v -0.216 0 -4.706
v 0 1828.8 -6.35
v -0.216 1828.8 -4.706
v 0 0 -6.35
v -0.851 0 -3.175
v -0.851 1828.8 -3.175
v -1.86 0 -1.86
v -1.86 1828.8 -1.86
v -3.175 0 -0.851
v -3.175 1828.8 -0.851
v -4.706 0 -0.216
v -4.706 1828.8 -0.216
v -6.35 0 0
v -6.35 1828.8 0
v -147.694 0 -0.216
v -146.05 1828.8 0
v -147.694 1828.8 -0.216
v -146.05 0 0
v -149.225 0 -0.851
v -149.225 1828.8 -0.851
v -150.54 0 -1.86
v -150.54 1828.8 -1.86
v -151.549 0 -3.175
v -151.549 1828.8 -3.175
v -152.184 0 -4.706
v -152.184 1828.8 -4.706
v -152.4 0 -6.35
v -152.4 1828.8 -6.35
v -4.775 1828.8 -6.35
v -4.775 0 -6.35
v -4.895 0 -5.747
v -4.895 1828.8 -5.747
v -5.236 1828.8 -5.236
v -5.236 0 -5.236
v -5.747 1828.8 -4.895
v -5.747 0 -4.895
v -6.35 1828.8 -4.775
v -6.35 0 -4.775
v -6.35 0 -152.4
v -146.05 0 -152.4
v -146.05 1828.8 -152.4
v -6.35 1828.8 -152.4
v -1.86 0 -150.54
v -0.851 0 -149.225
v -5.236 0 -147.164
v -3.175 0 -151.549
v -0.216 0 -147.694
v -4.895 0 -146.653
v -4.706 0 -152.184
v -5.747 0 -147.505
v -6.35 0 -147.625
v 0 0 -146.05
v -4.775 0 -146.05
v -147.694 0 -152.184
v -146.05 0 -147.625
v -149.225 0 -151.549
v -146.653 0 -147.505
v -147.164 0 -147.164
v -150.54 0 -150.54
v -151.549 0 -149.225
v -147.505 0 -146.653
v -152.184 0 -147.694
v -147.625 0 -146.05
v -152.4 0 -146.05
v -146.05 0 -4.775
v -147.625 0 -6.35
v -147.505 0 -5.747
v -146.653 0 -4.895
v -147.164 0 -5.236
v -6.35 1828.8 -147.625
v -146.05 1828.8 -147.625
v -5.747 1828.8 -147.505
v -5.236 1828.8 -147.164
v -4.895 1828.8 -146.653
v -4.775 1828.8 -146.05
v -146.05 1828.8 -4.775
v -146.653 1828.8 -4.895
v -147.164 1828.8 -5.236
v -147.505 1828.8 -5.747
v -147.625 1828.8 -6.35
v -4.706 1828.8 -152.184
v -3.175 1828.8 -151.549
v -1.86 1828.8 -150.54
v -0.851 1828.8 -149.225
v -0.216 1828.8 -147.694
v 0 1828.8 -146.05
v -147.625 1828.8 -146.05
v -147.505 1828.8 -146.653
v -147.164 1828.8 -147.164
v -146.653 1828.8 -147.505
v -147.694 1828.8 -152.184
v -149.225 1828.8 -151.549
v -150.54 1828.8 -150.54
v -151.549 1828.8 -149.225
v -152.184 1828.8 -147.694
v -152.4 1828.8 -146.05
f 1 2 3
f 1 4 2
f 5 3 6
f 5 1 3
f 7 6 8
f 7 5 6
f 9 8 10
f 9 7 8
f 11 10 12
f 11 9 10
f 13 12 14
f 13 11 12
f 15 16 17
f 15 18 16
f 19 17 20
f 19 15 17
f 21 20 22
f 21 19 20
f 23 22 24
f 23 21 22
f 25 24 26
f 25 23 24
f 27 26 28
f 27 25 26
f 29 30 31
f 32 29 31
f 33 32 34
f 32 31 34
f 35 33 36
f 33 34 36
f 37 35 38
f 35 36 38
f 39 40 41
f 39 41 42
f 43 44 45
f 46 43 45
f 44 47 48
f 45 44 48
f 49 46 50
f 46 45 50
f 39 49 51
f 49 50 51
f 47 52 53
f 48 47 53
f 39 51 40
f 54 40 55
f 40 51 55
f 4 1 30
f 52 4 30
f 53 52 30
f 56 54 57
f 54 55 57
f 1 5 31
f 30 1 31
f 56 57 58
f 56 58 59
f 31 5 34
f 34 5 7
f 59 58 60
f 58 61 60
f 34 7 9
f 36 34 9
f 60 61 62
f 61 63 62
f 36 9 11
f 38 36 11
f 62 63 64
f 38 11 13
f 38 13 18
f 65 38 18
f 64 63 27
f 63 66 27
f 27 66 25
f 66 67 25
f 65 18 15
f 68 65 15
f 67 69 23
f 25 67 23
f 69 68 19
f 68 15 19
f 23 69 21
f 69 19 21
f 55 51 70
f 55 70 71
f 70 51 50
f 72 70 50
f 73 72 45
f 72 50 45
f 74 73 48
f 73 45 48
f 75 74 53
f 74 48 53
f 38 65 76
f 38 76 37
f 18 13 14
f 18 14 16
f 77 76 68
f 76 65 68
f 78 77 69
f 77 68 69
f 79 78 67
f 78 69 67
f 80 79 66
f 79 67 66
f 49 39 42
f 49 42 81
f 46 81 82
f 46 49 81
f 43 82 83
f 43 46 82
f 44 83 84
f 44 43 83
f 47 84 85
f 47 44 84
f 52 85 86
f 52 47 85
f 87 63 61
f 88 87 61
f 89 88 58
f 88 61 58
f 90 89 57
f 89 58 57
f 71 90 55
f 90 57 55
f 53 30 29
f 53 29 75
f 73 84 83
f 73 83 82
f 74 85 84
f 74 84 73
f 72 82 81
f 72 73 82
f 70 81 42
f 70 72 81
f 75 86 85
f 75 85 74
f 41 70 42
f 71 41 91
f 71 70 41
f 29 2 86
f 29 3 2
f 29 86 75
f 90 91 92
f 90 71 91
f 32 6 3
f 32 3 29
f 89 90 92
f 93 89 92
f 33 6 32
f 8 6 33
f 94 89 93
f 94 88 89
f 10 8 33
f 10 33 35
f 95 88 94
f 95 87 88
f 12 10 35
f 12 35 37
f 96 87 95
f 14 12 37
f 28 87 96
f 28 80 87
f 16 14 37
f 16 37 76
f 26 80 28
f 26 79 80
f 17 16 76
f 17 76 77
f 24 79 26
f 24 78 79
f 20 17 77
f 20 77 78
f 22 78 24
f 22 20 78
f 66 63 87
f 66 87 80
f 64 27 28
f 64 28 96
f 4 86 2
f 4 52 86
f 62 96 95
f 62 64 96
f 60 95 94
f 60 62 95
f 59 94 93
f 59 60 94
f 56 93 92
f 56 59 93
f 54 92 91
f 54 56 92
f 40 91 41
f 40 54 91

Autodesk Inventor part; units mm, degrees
ref_plane "YZ Plane" through (0, 0, 0) normal (1, 0, 0) x (0, 1, 0)
ref_plane "XZ Plane" through (0, 0, 0) normal (0, 1, 0) x (-1, 0, 0)
ref_plane "XY Plane" through (0, 0, 0) normal (0, 0, 1) x (1, 0, 0)
sketch "Sketch1" plane through (0, 0, 0) normal (0, 1, 0) x (-1, 0, 0)
  line L0 (6.35, 0) -> (146.05, 0)
  line L1 (152.4, -6.35) -> (152.4, -146.05)
  line L2 (146.05, -152.4) -> (6.35, -152.4)
  line L3 (0, -146.05) -> (0, -6.35)
  arc A0 (146.05, -152.4) -> (152.4, -146.05) centre (146.05, -146.05) ccw
  arc A1 (152.4, -6.35) -> (146.05, 0) centre (146.05, -6.35) ccw
  arc A2 (0, -146.05) -> (6.35, -152.4) centre (6.35, -146.05) ccw
  arc A3 (152.4, -6.35) -> (146.05, 0) centre (146.05, -6.35) ccw
  arc A4 (6.35, 0) -> (0, -6.35) centre (6.35, -6.35) ccw
  line L4 (147.6248, -146.05) -> (147.6248, -6.35)
  arc A5 (147.6248, -6.35) -> (146.05, -4.7752) centre (146.05, -6.35) ccw
  line L5 (146.05, -4.7752) -> (6.35, -4.7752)
  arc A6 (6.35, -4.7752) -> (4.7752, -6.35) centre (6.35, -6.35) ccw
  line L6 (4.7752, -6.35) -> (4.7752, -146.05)
  arc A7 (4.7752, -146.05) -> (6.35, -147.6248) centre (6.35, -146.05) ccw
  line L7 (6.35, -147.6248) -> (146.05, -147.6248)
  arc A8 (146.05, -147.6248) -> (147.6248, -146.05) centre (146.05, -146.05) ccw
  point P0 (0, 0)
  point P1 (152.4, -152.4)
  point P2 (152.4, 0)
  point P3 (0, -152.4)
  dimension "d0" = 152.4
  dimension "d1" = 152.4
  dimension "d2" = 6.35
  dimension "d3" = 6.35
  dimension "d4" = 6.35
  dimension "d5" = 4.7752
extrude "Extrusion1" add sketch "Sketch1" along normal blind 1828.8
properties part number "21015-22-1-3- 6X6 Stanchion" material "Steel, Carbon"
